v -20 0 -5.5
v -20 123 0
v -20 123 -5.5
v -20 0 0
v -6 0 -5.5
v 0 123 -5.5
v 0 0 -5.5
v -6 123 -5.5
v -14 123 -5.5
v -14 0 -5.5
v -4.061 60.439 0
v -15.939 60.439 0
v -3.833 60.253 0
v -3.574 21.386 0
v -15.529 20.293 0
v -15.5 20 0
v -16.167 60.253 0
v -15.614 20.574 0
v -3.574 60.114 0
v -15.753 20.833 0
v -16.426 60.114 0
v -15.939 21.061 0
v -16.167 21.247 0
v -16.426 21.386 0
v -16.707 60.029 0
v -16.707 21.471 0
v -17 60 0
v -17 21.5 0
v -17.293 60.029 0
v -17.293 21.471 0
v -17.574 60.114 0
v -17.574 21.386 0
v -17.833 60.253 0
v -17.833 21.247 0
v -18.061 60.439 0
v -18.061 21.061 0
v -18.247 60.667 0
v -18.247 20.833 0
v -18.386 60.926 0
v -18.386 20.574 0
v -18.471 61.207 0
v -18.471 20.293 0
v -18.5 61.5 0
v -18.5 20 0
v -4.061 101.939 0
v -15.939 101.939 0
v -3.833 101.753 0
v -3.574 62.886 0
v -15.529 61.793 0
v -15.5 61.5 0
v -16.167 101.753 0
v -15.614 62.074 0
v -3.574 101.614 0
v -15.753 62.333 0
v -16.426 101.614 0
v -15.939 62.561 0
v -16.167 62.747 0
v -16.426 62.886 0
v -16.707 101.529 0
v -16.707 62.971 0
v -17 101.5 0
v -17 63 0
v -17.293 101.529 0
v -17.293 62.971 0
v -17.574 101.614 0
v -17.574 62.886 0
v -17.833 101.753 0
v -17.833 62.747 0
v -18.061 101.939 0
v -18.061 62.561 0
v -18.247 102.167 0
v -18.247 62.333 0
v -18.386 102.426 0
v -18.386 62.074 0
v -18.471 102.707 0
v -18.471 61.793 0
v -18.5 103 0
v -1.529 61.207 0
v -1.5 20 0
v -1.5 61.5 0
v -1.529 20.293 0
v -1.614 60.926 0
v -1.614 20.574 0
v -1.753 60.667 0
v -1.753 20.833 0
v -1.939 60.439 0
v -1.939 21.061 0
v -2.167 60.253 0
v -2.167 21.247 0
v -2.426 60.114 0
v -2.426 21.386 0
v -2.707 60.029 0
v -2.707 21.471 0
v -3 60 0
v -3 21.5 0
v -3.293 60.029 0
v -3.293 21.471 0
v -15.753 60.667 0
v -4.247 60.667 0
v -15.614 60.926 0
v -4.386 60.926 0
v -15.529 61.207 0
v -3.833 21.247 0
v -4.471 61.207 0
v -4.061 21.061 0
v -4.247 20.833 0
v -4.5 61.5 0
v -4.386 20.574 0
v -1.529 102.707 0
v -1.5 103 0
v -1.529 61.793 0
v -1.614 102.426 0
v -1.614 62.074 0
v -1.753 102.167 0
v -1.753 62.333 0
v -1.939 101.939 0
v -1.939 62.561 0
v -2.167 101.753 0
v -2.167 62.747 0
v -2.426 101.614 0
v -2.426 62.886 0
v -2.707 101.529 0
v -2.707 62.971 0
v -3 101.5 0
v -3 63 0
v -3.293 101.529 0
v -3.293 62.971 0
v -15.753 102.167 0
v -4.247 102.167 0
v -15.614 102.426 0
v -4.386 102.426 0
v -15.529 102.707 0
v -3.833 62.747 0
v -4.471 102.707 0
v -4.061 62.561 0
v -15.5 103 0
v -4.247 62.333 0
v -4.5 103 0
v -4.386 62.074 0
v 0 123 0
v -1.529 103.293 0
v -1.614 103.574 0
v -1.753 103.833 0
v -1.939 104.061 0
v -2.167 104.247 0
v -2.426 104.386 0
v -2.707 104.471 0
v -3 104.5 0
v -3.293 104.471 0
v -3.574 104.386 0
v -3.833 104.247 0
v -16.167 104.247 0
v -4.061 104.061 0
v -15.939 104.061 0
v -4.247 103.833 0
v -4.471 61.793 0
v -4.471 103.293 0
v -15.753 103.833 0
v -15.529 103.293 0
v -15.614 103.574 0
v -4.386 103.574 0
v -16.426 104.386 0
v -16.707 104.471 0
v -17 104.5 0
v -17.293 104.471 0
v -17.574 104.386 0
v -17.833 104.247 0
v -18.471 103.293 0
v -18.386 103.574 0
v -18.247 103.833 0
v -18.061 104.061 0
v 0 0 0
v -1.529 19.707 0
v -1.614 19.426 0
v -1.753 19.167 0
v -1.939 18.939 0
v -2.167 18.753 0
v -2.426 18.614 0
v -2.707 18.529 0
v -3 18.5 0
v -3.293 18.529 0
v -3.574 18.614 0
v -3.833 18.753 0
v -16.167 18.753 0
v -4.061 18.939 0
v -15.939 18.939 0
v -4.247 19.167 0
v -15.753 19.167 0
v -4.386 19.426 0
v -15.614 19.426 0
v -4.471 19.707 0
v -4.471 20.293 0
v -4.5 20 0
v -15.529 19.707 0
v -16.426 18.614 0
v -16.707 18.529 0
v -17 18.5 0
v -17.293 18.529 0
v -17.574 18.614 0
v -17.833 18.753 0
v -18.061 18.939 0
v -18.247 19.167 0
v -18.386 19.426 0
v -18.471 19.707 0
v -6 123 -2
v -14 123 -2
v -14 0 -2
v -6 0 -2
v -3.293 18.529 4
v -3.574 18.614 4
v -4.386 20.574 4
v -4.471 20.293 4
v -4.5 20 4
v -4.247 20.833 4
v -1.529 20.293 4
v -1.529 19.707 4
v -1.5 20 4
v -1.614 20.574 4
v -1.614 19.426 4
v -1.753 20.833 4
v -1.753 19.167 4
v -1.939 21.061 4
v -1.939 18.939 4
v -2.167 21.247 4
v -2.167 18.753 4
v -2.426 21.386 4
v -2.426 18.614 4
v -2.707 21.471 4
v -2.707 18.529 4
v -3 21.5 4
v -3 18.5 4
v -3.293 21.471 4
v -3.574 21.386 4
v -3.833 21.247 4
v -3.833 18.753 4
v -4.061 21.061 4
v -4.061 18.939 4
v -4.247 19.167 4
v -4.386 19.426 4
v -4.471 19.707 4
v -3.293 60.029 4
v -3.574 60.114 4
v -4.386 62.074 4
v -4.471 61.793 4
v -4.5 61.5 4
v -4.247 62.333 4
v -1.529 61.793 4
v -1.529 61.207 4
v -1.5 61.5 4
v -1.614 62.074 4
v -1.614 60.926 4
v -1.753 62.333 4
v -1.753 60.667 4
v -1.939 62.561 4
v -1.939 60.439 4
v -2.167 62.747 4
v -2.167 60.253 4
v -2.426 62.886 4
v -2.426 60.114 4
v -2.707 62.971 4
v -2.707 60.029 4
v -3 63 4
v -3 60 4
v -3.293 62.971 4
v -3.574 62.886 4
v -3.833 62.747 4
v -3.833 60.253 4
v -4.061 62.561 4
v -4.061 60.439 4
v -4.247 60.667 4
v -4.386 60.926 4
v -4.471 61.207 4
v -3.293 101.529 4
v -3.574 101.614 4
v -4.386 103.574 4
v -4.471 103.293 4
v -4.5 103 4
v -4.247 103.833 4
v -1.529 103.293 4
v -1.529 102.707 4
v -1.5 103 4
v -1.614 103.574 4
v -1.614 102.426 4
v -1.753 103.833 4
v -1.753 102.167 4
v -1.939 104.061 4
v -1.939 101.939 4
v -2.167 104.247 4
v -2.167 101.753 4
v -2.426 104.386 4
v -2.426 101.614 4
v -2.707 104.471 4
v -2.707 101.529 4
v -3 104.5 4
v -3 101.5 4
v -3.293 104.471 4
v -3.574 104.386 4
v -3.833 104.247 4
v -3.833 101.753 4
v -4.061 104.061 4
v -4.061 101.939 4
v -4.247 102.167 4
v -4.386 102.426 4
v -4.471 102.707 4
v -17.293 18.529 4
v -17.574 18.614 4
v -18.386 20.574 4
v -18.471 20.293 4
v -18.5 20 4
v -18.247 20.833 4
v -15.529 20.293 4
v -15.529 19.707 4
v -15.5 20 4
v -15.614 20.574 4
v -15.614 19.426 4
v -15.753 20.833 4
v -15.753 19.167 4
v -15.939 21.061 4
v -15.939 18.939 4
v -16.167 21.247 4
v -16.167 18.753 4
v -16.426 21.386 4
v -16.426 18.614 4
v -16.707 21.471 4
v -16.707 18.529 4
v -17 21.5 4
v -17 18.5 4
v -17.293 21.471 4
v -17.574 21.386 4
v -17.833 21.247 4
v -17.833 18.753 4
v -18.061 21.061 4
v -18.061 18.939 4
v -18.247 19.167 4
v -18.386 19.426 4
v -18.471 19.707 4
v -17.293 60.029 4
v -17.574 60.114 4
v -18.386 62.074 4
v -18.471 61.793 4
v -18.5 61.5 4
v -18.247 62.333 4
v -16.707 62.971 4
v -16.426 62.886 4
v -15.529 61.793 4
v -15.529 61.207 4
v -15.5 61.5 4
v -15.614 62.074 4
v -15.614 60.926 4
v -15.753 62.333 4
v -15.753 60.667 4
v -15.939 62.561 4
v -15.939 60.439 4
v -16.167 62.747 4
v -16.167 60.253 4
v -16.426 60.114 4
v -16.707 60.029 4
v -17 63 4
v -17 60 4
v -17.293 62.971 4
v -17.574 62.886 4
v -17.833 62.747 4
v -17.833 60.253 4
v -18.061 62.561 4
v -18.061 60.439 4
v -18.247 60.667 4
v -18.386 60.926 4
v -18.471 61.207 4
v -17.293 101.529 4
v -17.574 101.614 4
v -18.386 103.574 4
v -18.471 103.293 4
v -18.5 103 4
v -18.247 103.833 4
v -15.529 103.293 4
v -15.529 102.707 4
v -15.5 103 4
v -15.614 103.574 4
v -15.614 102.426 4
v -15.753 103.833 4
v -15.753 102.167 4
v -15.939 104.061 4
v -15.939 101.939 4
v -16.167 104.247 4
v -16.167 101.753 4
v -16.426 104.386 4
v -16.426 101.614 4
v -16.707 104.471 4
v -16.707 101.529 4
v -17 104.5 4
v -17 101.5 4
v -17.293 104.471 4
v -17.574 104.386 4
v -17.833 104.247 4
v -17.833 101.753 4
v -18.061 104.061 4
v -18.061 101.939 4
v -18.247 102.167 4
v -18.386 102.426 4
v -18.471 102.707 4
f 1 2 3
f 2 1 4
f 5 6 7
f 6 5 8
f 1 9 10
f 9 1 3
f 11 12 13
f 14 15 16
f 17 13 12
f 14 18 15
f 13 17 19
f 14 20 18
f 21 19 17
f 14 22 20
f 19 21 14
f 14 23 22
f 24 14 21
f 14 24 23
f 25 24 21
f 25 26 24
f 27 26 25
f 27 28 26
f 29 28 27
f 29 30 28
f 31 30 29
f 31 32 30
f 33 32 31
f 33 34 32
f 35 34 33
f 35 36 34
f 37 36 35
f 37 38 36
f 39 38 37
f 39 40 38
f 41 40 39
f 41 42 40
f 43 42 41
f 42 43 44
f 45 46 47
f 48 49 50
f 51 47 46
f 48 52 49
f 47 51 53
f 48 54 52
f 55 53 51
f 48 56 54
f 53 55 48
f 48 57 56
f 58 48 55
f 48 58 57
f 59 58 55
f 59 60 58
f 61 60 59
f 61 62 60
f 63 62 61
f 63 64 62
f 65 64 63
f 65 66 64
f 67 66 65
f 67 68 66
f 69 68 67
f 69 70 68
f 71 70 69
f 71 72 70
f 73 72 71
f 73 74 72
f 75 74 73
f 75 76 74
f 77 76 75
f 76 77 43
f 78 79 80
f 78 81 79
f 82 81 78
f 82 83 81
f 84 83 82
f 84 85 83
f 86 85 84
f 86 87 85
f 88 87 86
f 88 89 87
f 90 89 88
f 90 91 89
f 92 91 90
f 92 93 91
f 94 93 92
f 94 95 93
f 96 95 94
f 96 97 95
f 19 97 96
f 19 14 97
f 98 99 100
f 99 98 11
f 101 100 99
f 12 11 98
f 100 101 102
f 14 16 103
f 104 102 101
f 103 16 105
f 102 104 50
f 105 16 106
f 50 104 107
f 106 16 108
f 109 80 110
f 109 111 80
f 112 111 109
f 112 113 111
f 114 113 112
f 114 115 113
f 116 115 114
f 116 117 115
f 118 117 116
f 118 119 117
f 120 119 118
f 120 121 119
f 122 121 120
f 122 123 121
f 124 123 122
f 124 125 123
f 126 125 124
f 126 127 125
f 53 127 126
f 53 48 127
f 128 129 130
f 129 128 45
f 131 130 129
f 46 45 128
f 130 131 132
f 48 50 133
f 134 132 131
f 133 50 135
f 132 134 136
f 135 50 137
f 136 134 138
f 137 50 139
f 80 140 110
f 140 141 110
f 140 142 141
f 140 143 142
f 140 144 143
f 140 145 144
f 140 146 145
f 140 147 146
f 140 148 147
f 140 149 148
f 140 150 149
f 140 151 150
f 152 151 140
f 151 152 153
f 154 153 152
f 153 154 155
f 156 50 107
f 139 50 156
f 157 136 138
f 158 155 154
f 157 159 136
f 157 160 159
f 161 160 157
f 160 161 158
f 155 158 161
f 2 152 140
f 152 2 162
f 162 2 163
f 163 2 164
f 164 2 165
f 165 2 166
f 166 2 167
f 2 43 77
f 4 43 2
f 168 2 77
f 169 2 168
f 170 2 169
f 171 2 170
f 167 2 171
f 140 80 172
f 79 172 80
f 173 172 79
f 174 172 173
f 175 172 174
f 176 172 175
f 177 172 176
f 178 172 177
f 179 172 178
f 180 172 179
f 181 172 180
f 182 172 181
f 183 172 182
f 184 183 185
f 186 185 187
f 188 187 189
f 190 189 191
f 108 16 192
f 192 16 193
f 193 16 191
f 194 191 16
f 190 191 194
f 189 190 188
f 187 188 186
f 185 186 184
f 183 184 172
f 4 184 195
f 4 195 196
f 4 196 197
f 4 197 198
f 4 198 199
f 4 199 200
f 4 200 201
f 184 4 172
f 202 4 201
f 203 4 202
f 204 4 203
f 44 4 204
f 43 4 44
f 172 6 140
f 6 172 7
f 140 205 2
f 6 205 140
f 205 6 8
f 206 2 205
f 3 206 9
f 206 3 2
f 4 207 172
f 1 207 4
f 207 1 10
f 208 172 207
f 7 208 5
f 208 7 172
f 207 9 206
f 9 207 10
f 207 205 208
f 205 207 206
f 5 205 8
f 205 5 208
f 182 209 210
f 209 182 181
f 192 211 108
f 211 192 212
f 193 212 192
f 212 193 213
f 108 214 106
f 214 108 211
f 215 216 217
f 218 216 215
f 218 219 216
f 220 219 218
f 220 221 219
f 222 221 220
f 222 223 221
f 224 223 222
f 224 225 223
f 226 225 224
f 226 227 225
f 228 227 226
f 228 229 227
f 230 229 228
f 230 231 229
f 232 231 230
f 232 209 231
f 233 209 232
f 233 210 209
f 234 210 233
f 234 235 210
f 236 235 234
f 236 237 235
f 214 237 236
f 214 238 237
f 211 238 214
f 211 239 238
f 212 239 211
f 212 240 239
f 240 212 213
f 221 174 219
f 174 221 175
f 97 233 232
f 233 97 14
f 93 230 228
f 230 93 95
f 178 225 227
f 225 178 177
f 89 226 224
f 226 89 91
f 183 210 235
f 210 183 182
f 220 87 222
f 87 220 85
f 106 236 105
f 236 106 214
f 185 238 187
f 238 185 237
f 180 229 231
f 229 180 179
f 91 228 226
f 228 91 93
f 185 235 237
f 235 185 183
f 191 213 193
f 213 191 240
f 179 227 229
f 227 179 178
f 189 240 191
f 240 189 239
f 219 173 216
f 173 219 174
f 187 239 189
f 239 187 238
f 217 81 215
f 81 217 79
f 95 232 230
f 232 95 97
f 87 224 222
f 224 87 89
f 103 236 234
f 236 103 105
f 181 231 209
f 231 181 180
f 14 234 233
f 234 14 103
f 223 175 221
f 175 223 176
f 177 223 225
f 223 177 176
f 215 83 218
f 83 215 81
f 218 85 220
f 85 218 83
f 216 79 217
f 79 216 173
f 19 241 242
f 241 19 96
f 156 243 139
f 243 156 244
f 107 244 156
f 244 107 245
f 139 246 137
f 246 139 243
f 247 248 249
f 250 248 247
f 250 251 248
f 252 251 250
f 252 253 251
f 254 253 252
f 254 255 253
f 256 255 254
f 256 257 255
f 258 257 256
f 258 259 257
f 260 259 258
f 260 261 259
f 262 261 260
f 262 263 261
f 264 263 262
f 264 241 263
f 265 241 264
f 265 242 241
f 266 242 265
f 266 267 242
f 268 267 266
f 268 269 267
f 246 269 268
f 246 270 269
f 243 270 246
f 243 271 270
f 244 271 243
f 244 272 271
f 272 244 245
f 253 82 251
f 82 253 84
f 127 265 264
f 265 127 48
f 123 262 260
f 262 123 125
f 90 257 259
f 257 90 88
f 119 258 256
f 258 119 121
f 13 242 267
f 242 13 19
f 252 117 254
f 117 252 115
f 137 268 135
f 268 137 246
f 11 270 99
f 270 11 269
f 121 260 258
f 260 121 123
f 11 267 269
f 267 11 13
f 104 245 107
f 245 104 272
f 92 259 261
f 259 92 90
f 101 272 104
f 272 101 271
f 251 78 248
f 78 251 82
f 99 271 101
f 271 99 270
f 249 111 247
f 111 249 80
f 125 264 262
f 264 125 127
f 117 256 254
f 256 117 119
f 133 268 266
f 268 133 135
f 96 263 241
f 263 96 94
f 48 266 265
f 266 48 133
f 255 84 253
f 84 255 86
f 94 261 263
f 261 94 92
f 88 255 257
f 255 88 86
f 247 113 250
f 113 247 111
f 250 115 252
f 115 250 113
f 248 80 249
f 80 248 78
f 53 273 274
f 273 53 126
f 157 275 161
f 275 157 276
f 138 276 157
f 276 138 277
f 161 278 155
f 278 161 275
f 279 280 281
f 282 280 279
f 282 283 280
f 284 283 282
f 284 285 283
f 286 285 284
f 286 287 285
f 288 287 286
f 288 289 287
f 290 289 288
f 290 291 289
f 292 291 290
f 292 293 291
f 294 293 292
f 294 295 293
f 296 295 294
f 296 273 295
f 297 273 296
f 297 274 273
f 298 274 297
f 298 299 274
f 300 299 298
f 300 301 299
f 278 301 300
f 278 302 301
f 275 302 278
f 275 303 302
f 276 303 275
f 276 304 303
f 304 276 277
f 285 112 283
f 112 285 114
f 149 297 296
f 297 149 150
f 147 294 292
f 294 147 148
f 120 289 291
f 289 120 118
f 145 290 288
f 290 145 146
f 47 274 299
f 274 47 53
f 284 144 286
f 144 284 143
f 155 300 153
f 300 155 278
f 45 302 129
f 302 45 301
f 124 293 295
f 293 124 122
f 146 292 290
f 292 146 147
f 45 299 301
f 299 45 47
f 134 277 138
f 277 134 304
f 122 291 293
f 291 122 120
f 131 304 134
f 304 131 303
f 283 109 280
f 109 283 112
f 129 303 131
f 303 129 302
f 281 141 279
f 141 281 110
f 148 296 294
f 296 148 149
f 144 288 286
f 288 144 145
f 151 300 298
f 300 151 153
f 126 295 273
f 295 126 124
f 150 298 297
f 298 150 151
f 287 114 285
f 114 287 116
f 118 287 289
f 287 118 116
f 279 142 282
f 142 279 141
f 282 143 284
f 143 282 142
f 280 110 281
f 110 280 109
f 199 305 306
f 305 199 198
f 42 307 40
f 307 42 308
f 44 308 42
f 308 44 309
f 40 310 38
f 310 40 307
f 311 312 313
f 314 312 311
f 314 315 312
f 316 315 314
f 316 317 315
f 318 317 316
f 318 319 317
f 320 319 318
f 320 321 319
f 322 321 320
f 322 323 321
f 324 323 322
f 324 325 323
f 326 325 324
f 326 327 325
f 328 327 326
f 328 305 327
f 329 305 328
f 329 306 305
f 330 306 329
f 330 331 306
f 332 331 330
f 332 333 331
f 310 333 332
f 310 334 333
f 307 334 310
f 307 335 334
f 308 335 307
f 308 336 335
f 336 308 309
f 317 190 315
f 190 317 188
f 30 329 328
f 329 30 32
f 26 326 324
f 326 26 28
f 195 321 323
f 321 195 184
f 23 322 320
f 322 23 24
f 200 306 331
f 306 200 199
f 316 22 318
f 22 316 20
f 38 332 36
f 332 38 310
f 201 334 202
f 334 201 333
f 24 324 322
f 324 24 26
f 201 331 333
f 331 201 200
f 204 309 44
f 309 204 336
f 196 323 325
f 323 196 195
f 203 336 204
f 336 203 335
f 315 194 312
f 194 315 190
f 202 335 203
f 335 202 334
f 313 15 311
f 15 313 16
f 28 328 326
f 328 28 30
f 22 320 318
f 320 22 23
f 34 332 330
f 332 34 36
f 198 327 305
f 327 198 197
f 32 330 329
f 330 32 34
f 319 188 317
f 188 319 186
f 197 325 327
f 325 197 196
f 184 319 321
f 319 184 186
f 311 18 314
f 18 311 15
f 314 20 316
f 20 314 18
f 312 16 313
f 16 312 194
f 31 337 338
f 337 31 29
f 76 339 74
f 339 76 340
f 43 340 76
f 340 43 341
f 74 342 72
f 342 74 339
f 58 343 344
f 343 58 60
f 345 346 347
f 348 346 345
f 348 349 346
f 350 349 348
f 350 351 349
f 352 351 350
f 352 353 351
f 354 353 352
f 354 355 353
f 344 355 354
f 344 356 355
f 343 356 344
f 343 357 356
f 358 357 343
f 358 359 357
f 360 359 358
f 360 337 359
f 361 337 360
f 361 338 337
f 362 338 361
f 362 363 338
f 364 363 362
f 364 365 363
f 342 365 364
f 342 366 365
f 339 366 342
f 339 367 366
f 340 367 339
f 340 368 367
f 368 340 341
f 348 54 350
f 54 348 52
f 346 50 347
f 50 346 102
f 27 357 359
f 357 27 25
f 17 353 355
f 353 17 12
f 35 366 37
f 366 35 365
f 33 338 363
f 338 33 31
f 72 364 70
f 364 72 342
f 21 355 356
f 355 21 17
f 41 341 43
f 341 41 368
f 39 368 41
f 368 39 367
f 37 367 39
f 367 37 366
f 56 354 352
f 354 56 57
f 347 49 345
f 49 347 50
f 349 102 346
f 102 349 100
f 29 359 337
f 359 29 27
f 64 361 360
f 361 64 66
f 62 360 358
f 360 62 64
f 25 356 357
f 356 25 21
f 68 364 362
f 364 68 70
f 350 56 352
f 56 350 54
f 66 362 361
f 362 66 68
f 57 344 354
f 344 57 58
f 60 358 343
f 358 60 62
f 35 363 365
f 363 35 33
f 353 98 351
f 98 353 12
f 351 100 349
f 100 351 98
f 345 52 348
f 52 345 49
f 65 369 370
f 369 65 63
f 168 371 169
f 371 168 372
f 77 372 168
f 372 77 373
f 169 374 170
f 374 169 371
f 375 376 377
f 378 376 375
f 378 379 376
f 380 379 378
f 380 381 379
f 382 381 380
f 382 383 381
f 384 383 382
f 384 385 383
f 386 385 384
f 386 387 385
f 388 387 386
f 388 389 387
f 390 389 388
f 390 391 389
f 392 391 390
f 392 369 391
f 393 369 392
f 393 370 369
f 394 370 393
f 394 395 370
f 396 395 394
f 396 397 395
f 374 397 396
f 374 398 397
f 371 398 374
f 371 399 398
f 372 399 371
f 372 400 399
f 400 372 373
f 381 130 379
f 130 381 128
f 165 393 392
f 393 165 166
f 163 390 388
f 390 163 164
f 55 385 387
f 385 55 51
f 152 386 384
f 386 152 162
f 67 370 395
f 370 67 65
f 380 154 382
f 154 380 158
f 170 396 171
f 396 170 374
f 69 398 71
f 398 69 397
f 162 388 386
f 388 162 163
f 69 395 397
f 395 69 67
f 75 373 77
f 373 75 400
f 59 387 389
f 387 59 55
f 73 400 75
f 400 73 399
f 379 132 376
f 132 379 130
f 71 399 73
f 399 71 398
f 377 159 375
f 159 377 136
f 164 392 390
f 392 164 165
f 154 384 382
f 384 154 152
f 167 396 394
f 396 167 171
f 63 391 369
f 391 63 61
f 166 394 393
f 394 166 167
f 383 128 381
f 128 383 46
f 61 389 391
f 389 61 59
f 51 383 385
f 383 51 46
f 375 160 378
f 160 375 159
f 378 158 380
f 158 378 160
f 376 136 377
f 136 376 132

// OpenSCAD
$fn = 32;

listelengde = 123;
disklistetykkelse = 3.5;
disklistebredde = 6;
disklistepadding = 2;
diskpluggtykkelse = 2.65;
kabinettlistevinger = disklistebredde;
kabinettlistebredde = disklistebredde+2*kabinettlistevinger+disklistepadding;
kabinettlistetykkelse = disklistetykkelse + 2;
kabinettpluggtykkelse = 3;
kabinettplugglengde = 4;

module diskliste(ht = "b") {
    handtak = disklistetykkelse*4;

// Handtak
    if (ht == "b" || ht == "h" || ht == "v") {
        mask_h = 0;
        mask_v = 0;
        
        difference() {    
            translate([disklistetykkelse,-handtak]) {
                difference() {
                    cylinder(h=disklistetykkelse,r=handtak);
//                    cylinder(h=listtykkelse,r=handtak/2);
                }
            }
            
            if (ht == "h") {
                translate([disklistebredde,-handtak*2]) {
                    cube([disklistebredde*2,handtak*2,disklistetykkelse]);
                }
            }

            if (ht == "v") {
                translate([0-disklistebredde*2,-handtak*2]) {
                    cube([disklistebredde*2,handtak*2,disklistetykkelse]);
                }
            }
        }
    }
    translate([disklistebredde/2,5,0]) {
        cylinder(h=disklistetykkelse+4, d=diskpluggtykkelse);
        translate([0,61,0]) {
            cylinder(h=disklistetykkelse+4, d=diskpluggtykkelse);
            translate([0,41,0]) {
                cylinder(h=disklistetykkelse+4, d=diskpluggtykkelse);
            }
        }
    }
    
    translate([0,-2,0]) {
        cube([disklistebredde,listelengde+2-disklistebredde/2,disklistetykkelse]);
        translate([disklistebredde/2,listelengde+2-disklistebredde/2,0]) {
            cylinder(d=disklistebredde, h=disklistetykkelse);
        }
    }

}

module kabinettliste() {
    difference() {
        cube([kabinettlistebredde,listelengde,kabinettlistetykkelse]);
        translate([kabinettlistevinger,0,kabinettlistetykkelse-disklistetykkelse]) {
            cube([disklistebredde+disklistepadding,listelengde+2,disklistetykkelse]);
        }
    }
    translate([kabinettlistevinger/2,20,-kabinettplugglengde]) {
        cylinder(h=kabinettplugglengde, d=kabinettpluggtykkelse);
    }
    translate([kabinettlistevinger/2,listelengde/2,-kabinettplugglengde]) {
        cylinder(h=kabinettplugglengde, d=kabinettpluggtykkelse);
    }
    translate([kabinettlistevinger/2,listelengde-20,-kabinettplugglengde]) {
        cylinder(h=kabinettplugglengde, d=kabinettpluggtykkelse);
    }

    translate([kabinettlistevinger+disklistebredde+disklistepadding+kabinettlistevinger/2,20,-kabinettplugglengde]) {
        cylinder(h=kabinettplugglengde, d=kabinettpluggtykkelse);
    }
    translate([kabinettlistevinger+disklistebredde+disklistepadding+kabinettlistevinger/2,listelengde/2,-kabinettplugglengde]) {
        cylinder(h=kabinettplugglengde, d=kabinettpluggtykkelse);
    }
    translate([kabinettlistevinger+disklistebredde+disklistepadding+kabinettlistevinger/2,listelengde-20,-kabinettplugglengde]) {
        cylinder(h=kabinettplugglengde, d=kabinettpluggtykkelse);
    }
}

/*
translate([0,0,0]) {
    diskliste("h");
}
translate([9,0,0]) {
    diskliste("v");
}
*/

/*
translate([0,0,0]) {
    diskliste("h");
}
translate([13,0,0]) {
    diskliste("v");
}
translate([45,0,0]) {
    diskliste("h");
}
translate([57,0,0]) {
    diskliste("v");
}
rotate(270) {
    translate([-159,0,0]) {
        diskliste("h");
    }
}
rotate(90) {
    translate([132,-90,0]) {
        diskliste("v");
    }
}

*/
rotate([0,180,0]) {
    translate([0,0,0]) {
        kabinettliste();
    }
}
/*
translate([-46,5,0]) {
    kabinettliste();
}
translate([23,5,0]) {
    kabinettliste();
}
translate([68,5,0]) {
    kabinettliste();
}
translate([90,5,0]) {
    kabinettliste();
}
translate([112,5,0]) {
    kabinettliste();
}
*/
